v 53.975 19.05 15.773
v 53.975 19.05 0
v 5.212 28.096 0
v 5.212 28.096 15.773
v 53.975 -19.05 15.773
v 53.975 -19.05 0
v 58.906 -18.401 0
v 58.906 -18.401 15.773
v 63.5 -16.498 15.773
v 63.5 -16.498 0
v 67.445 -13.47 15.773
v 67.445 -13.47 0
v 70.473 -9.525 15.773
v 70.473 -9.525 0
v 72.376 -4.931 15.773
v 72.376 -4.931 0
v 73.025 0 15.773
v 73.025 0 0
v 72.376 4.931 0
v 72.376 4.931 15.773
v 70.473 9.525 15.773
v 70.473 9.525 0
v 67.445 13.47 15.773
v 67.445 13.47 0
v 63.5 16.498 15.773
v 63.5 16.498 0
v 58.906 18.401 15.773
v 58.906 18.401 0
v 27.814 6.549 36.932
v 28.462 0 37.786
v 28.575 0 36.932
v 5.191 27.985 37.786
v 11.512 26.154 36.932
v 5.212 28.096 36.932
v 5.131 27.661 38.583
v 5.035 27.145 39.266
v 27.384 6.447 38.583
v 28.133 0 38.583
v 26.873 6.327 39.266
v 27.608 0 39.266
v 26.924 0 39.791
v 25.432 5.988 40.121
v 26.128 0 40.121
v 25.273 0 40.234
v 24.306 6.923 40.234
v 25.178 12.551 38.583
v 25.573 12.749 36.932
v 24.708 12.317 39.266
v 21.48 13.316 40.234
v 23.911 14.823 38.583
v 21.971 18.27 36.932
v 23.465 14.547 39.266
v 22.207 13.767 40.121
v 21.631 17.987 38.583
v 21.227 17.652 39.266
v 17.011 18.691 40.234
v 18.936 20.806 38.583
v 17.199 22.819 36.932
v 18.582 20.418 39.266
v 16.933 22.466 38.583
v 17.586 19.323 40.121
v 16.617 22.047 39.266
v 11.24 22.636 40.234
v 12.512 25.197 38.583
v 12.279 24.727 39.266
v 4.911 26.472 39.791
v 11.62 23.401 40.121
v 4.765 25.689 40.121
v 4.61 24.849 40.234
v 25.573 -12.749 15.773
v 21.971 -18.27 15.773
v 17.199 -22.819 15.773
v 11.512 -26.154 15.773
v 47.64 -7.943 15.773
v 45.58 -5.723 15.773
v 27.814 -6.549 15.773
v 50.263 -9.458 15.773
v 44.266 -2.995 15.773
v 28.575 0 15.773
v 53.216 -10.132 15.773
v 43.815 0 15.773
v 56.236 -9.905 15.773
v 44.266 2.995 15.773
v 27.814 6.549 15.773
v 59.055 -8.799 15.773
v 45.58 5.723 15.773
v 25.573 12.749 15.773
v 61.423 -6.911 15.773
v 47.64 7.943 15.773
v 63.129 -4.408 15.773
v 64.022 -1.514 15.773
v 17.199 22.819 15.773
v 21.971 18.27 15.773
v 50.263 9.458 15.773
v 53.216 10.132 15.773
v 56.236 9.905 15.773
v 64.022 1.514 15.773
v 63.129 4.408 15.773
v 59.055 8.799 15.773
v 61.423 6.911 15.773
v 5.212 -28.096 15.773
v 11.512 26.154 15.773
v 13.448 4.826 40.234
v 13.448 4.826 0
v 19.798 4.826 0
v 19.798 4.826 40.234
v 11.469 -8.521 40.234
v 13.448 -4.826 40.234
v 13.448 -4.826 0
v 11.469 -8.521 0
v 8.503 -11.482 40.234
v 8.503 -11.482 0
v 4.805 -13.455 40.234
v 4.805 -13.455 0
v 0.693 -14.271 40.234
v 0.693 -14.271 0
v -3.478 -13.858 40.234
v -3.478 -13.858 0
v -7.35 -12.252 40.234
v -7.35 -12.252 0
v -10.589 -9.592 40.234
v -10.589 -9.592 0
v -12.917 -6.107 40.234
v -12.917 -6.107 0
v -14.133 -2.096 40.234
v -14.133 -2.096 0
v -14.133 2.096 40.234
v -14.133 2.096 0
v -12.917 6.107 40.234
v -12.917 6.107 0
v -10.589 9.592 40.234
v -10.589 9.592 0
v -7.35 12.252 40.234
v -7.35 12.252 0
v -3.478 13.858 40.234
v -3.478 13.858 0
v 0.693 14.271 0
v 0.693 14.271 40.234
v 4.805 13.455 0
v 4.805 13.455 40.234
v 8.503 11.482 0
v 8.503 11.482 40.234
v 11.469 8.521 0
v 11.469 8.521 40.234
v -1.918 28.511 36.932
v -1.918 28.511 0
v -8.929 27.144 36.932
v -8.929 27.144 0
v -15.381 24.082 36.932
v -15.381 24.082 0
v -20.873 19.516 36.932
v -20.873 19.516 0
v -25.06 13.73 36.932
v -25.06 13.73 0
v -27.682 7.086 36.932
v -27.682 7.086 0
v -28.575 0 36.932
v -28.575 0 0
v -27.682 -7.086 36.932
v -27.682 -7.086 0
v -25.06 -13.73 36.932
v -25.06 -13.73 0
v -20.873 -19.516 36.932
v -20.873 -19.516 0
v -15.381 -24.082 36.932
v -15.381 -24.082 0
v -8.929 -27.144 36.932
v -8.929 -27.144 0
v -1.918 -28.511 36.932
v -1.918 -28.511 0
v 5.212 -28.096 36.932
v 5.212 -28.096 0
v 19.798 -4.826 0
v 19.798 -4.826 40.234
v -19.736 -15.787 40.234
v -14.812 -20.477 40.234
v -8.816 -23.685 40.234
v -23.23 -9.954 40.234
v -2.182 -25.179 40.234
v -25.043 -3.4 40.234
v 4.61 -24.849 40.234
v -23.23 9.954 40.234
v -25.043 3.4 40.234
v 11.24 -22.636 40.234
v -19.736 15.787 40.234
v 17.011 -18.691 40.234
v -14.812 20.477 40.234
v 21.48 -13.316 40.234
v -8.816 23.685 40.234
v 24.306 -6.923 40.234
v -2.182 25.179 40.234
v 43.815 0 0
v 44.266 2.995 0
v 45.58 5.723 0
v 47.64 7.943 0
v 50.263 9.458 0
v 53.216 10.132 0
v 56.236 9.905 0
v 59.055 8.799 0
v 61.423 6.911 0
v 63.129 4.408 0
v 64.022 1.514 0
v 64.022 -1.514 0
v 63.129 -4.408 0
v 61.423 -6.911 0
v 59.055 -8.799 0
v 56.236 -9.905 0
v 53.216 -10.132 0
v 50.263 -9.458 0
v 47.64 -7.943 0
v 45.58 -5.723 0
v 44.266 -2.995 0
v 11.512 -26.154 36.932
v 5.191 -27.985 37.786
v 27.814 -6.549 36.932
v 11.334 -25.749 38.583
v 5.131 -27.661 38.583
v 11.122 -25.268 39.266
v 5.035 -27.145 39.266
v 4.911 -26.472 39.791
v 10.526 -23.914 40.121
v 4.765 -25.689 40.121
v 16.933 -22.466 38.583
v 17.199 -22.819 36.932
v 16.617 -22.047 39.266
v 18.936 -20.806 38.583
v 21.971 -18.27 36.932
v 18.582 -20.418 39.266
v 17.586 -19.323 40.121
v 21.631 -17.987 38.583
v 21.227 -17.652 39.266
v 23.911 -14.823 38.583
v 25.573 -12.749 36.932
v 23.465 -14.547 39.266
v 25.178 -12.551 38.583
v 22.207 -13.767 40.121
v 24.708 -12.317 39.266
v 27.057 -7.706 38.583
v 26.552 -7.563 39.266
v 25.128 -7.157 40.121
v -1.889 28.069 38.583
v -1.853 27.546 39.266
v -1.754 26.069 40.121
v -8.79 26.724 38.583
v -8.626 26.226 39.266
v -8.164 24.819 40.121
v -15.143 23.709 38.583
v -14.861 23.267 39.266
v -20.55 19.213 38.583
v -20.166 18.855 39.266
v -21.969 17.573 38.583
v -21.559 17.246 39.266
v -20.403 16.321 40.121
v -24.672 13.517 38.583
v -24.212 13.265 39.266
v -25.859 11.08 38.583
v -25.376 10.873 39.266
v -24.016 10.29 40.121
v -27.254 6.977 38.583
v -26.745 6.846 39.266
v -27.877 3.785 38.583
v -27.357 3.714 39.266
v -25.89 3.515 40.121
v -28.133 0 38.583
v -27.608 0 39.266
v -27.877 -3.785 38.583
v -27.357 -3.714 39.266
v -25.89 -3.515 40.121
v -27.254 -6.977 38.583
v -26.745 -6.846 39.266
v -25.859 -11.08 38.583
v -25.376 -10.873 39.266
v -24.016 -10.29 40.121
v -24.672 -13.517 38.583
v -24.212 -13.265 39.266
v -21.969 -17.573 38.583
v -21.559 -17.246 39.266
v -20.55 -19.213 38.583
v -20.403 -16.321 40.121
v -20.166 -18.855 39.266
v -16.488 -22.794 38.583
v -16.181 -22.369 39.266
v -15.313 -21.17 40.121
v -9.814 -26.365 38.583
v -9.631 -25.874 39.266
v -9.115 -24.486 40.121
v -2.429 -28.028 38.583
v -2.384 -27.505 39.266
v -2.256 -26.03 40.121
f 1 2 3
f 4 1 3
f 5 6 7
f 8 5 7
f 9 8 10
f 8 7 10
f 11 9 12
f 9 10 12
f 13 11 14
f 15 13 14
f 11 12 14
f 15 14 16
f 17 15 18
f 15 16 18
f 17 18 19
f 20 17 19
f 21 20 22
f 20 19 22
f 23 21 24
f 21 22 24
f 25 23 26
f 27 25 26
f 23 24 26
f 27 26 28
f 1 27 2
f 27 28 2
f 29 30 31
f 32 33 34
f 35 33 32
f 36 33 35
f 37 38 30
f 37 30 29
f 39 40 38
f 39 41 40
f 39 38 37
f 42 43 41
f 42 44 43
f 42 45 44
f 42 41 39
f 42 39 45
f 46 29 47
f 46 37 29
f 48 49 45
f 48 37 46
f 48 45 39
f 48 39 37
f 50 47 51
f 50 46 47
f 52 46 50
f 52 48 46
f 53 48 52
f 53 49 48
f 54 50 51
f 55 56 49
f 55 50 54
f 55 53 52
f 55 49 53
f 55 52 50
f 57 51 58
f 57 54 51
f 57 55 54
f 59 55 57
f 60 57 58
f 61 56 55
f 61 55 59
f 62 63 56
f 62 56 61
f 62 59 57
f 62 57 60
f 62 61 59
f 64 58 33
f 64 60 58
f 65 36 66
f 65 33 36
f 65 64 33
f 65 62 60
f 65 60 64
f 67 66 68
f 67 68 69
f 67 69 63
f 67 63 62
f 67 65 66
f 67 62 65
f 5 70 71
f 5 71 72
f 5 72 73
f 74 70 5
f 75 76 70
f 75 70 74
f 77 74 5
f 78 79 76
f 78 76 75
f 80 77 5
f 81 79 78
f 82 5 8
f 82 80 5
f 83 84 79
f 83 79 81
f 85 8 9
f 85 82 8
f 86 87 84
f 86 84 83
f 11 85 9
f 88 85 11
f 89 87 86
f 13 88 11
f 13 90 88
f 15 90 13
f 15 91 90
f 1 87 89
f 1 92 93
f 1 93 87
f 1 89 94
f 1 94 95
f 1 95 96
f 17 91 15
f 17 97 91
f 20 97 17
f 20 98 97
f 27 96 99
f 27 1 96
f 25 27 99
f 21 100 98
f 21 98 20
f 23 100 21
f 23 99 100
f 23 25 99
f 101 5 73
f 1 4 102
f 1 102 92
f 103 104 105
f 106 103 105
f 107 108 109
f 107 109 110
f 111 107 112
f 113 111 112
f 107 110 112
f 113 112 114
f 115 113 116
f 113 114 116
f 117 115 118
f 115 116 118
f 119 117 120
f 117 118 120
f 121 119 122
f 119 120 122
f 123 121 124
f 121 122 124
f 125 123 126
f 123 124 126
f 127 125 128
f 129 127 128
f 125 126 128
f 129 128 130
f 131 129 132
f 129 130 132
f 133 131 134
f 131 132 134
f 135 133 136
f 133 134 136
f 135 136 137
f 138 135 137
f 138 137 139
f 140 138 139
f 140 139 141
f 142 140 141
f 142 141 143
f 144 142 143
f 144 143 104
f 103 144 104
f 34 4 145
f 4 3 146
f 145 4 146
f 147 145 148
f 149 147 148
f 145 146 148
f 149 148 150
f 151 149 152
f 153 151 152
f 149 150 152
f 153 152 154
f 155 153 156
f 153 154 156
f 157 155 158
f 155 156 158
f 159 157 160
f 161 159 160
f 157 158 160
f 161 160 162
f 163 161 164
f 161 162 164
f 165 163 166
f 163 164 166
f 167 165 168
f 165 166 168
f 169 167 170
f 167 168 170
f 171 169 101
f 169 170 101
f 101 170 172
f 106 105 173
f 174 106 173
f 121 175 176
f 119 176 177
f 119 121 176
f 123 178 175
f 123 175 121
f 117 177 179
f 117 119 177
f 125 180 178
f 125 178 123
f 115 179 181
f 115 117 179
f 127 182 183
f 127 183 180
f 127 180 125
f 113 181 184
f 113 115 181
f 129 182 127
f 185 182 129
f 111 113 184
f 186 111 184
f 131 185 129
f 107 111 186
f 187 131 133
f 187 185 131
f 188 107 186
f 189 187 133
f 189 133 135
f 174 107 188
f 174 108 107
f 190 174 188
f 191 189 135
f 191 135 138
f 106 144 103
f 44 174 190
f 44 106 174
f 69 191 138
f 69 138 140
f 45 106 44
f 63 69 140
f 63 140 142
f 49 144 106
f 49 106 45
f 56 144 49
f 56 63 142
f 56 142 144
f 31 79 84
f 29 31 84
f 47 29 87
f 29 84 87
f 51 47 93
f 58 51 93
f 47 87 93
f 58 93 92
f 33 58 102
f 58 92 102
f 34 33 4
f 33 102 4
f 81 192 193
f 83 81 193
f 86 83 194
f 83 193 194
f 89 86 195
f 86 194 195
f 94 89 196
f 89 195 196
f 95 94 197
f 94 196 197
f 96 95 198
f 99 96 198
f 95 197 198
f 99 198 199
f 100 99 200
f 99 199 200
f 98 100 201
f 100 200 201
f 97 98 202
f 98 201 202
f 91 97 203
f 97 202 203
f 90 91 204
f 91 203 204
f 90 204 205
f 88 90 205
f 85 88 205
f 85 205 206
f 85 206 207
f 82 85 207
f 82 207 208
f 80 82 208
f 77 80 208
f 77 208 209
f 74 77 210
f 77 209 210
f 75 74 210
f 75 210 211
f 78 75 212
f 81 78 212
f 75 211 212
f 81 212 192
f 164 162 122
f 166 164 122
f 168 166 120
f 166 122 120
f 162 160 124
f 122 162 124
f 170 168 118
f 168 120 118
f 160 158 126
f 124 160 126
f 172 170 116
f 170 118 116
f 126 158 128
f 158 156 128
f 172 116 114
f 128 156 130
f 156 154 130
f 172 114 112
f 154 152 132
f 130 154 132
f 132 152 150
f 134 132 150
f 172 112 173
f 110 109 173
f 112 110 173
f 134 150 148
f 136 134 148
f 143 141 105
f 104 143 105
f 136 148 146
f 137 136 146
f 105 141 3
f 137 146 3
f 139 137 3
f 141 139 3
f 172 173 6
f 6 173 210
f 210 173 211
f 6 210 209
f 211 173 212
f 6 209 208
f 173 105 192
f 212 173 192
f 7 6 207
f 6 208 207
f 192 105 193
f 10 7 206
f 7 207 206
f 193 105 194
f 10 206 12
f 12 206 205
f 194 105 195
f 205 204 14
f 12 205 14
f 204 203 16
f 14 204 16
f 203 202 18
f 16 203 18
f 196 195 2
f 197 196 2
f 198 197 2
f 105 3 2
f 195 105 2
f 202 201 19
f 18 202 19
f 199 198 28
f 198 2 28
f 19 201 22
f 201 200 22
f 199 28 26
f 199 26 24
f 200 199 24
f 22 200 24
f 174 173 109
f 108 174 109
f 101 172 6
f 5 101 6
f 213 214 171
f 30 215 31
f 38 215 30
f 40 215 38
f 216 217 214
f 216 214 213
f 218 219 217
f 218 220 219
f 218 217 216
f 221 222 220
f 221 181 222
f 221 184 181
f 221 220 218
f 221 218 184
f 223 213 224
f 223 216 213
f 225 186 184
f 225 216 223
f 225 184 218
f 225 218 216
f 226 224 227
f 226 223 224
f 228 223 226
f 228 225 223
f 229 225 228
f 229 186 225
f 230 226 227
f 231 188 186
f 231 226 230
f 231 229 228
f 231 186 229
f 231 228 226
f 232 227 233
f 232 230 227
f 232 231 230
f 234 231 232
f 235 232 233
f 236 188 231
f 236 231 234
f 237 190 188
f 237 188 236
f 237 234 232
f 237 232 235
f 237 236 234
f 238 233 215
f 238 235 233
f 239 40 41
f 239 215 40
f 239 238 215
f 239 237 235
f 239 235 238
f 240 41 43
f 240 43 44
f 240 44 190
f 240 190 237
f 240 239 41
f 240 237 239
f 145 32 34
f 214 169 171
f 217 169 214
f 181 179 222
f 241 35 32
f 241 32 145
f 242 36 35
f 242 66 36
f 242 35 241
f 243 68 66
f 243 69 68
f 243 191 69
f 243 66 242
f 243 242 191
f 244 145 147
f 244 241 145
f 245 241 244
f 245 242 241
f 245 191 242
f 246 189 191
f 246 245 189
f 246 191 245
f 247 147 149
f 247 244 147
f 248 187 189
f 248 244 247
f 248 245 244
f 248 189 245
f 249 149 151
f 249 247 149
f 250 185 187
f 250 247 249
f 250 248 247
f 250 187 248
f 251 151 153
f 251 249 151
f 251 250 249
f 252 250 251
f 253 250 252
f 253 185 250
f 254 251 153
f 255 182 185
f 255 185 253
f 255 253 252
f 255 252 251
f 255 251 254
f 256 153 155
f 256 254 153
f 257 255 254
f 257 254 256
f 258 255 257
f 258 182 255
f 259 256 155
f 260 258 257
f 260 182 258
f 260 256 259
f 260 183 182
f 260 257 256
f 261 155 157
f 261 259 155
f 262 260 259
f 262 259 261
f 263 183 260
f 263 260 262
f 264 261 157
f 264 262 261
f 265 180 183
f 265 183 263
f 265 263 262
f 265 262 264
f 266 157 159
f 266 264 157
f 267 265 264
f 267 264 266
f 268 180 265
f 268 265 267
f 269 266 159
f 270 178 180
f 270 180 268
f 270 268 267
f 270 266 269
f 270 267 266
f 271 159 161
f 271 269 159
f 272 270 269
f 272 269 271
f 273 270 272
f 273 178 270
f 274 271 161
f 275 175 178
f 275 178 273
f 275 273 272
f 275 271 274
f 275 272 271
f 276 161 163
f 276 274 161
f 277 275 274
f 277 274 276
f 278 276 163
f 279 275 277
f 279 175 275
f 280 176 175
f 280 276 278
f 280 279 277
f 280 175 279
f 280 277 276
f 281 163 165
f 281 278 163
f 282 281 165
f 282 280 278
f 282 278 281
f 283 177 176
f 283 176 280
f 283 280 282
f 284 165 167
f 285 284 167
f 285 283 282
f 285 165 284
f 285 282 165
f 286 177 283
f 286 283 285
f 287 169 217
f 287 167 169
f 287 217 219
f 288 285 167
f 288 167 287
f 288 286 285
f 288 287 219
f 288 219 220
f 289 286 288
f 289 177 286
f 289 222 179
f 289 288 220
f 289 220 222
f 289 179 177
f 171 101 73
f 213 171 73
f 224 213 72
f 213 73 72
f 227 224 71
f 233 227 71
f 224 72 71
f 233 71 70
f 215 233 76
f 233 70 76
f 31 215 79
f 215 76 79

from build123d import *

# Parameters (mm, degrees)
F1_DEPTH = 40.2336
F2_DEPTH = 15.7734
F3_R     = 3.302


# Not quite as in the source:
# - a feature names something its author has since deleted; it is built from what else it names


with BuildPart() as f1:
    # F0 (on Top) → F1 (new body)
    with BuildSketch(Plane.XY):
        with BuildLine():
            ThreePointArc((5.2118165727, -28.0956863773), (21.9710978739, -18.2702348977), (28.575, 0))
            ThreePointArc((28.575, 0), (21.9710978739, 18.2702348977), (5.2118165727, 28.0956863773))
            ThreePointArc((5.2118165727, 28.0956863773), (-28.575, 0), (5.2118165727, -28.0956863773))
        make_face()
        with BuildLine():
            ThreePointArc((13.4477648793, -4.826), (-14.2875, 0), (13.4477648793, 4.826))
            Line((13.4477648793, 4.826), (19.7977648793, 4.826))
            Line((19.7977648793, 4.826), (19.7977648793, 0))
            Line((19.7977648793, 0), (19.7977648793, -4.826))
            Line((19.7977648793, -4.826), (13.4477648793, -4.826))
        make_face(mode=Mode.SUBTRACT)
    extrude(amount=F1_DEPTH)

    # F0 (on Top) → F2 (join)
    with BuildSketch(Plane.XY):
        with BuildLine():
            ThreePointArc((5.2118165727, 28.0956863773), (21.9710978739, 18.2702348977), (28.575, 0))
            Line((28.575, 0), (34.925, 0))
            ThreePointArc((34.925, 0), (40.5046158184, 13.4703841816), (53.975, 19.05))
            Line((53.975, 19.05), (5.2118165727, 28.0956863773))
        make_face()
        with BuildLine():
            Line((34.925, 0), (28.575, 0))
            ThreePointArc((28.575, 0), (21.9710978739, -18.2702348977), (5.2118165727, -28.0956863773))
            Line((5.2118165727, -28.0956863773), (53.975, -19.05))
            ThreePointArc((53.975, -19.05), (40.5046158184, -13.4703841816), (34.925, 0))
        make_face()
        with BuildLine():
            ThreePointArc((53.975, 19.05), (40.5046158184, 13.4703841816), (34.925, 0))
            ThreePointArc((34.925, 0), (40.5046158184, -13.4703841816), (53.975, -19.05))
            ThreePointArc((53.975, -19.05), (67.4453841816, -13.4703841816), (73.025, 0))
            ThreePointArc((73.025, 0), (67.4453841816, 13.4703841816), (53.975, 19.05))
        make_face()
        with BuildLine():
            ThreePointArc((64.135, 0), (53.975, -10.16), (43.815, 0))
            ThreePointArc((43.815, 0), (53.975, 10.16), (64.135, 0))
        make_face(mode=Mode.SUBTRACT)
    extrude(amount=F2_DEPTH)

    # F3
    f3_edges = [f1.edges().sort_by_distance(p)[0] for p in [
        (-5.211817, 28.095686, 40.2336),
    ]]
    fillet(f3_edges, radius=F3_R)


solid = f1.part
